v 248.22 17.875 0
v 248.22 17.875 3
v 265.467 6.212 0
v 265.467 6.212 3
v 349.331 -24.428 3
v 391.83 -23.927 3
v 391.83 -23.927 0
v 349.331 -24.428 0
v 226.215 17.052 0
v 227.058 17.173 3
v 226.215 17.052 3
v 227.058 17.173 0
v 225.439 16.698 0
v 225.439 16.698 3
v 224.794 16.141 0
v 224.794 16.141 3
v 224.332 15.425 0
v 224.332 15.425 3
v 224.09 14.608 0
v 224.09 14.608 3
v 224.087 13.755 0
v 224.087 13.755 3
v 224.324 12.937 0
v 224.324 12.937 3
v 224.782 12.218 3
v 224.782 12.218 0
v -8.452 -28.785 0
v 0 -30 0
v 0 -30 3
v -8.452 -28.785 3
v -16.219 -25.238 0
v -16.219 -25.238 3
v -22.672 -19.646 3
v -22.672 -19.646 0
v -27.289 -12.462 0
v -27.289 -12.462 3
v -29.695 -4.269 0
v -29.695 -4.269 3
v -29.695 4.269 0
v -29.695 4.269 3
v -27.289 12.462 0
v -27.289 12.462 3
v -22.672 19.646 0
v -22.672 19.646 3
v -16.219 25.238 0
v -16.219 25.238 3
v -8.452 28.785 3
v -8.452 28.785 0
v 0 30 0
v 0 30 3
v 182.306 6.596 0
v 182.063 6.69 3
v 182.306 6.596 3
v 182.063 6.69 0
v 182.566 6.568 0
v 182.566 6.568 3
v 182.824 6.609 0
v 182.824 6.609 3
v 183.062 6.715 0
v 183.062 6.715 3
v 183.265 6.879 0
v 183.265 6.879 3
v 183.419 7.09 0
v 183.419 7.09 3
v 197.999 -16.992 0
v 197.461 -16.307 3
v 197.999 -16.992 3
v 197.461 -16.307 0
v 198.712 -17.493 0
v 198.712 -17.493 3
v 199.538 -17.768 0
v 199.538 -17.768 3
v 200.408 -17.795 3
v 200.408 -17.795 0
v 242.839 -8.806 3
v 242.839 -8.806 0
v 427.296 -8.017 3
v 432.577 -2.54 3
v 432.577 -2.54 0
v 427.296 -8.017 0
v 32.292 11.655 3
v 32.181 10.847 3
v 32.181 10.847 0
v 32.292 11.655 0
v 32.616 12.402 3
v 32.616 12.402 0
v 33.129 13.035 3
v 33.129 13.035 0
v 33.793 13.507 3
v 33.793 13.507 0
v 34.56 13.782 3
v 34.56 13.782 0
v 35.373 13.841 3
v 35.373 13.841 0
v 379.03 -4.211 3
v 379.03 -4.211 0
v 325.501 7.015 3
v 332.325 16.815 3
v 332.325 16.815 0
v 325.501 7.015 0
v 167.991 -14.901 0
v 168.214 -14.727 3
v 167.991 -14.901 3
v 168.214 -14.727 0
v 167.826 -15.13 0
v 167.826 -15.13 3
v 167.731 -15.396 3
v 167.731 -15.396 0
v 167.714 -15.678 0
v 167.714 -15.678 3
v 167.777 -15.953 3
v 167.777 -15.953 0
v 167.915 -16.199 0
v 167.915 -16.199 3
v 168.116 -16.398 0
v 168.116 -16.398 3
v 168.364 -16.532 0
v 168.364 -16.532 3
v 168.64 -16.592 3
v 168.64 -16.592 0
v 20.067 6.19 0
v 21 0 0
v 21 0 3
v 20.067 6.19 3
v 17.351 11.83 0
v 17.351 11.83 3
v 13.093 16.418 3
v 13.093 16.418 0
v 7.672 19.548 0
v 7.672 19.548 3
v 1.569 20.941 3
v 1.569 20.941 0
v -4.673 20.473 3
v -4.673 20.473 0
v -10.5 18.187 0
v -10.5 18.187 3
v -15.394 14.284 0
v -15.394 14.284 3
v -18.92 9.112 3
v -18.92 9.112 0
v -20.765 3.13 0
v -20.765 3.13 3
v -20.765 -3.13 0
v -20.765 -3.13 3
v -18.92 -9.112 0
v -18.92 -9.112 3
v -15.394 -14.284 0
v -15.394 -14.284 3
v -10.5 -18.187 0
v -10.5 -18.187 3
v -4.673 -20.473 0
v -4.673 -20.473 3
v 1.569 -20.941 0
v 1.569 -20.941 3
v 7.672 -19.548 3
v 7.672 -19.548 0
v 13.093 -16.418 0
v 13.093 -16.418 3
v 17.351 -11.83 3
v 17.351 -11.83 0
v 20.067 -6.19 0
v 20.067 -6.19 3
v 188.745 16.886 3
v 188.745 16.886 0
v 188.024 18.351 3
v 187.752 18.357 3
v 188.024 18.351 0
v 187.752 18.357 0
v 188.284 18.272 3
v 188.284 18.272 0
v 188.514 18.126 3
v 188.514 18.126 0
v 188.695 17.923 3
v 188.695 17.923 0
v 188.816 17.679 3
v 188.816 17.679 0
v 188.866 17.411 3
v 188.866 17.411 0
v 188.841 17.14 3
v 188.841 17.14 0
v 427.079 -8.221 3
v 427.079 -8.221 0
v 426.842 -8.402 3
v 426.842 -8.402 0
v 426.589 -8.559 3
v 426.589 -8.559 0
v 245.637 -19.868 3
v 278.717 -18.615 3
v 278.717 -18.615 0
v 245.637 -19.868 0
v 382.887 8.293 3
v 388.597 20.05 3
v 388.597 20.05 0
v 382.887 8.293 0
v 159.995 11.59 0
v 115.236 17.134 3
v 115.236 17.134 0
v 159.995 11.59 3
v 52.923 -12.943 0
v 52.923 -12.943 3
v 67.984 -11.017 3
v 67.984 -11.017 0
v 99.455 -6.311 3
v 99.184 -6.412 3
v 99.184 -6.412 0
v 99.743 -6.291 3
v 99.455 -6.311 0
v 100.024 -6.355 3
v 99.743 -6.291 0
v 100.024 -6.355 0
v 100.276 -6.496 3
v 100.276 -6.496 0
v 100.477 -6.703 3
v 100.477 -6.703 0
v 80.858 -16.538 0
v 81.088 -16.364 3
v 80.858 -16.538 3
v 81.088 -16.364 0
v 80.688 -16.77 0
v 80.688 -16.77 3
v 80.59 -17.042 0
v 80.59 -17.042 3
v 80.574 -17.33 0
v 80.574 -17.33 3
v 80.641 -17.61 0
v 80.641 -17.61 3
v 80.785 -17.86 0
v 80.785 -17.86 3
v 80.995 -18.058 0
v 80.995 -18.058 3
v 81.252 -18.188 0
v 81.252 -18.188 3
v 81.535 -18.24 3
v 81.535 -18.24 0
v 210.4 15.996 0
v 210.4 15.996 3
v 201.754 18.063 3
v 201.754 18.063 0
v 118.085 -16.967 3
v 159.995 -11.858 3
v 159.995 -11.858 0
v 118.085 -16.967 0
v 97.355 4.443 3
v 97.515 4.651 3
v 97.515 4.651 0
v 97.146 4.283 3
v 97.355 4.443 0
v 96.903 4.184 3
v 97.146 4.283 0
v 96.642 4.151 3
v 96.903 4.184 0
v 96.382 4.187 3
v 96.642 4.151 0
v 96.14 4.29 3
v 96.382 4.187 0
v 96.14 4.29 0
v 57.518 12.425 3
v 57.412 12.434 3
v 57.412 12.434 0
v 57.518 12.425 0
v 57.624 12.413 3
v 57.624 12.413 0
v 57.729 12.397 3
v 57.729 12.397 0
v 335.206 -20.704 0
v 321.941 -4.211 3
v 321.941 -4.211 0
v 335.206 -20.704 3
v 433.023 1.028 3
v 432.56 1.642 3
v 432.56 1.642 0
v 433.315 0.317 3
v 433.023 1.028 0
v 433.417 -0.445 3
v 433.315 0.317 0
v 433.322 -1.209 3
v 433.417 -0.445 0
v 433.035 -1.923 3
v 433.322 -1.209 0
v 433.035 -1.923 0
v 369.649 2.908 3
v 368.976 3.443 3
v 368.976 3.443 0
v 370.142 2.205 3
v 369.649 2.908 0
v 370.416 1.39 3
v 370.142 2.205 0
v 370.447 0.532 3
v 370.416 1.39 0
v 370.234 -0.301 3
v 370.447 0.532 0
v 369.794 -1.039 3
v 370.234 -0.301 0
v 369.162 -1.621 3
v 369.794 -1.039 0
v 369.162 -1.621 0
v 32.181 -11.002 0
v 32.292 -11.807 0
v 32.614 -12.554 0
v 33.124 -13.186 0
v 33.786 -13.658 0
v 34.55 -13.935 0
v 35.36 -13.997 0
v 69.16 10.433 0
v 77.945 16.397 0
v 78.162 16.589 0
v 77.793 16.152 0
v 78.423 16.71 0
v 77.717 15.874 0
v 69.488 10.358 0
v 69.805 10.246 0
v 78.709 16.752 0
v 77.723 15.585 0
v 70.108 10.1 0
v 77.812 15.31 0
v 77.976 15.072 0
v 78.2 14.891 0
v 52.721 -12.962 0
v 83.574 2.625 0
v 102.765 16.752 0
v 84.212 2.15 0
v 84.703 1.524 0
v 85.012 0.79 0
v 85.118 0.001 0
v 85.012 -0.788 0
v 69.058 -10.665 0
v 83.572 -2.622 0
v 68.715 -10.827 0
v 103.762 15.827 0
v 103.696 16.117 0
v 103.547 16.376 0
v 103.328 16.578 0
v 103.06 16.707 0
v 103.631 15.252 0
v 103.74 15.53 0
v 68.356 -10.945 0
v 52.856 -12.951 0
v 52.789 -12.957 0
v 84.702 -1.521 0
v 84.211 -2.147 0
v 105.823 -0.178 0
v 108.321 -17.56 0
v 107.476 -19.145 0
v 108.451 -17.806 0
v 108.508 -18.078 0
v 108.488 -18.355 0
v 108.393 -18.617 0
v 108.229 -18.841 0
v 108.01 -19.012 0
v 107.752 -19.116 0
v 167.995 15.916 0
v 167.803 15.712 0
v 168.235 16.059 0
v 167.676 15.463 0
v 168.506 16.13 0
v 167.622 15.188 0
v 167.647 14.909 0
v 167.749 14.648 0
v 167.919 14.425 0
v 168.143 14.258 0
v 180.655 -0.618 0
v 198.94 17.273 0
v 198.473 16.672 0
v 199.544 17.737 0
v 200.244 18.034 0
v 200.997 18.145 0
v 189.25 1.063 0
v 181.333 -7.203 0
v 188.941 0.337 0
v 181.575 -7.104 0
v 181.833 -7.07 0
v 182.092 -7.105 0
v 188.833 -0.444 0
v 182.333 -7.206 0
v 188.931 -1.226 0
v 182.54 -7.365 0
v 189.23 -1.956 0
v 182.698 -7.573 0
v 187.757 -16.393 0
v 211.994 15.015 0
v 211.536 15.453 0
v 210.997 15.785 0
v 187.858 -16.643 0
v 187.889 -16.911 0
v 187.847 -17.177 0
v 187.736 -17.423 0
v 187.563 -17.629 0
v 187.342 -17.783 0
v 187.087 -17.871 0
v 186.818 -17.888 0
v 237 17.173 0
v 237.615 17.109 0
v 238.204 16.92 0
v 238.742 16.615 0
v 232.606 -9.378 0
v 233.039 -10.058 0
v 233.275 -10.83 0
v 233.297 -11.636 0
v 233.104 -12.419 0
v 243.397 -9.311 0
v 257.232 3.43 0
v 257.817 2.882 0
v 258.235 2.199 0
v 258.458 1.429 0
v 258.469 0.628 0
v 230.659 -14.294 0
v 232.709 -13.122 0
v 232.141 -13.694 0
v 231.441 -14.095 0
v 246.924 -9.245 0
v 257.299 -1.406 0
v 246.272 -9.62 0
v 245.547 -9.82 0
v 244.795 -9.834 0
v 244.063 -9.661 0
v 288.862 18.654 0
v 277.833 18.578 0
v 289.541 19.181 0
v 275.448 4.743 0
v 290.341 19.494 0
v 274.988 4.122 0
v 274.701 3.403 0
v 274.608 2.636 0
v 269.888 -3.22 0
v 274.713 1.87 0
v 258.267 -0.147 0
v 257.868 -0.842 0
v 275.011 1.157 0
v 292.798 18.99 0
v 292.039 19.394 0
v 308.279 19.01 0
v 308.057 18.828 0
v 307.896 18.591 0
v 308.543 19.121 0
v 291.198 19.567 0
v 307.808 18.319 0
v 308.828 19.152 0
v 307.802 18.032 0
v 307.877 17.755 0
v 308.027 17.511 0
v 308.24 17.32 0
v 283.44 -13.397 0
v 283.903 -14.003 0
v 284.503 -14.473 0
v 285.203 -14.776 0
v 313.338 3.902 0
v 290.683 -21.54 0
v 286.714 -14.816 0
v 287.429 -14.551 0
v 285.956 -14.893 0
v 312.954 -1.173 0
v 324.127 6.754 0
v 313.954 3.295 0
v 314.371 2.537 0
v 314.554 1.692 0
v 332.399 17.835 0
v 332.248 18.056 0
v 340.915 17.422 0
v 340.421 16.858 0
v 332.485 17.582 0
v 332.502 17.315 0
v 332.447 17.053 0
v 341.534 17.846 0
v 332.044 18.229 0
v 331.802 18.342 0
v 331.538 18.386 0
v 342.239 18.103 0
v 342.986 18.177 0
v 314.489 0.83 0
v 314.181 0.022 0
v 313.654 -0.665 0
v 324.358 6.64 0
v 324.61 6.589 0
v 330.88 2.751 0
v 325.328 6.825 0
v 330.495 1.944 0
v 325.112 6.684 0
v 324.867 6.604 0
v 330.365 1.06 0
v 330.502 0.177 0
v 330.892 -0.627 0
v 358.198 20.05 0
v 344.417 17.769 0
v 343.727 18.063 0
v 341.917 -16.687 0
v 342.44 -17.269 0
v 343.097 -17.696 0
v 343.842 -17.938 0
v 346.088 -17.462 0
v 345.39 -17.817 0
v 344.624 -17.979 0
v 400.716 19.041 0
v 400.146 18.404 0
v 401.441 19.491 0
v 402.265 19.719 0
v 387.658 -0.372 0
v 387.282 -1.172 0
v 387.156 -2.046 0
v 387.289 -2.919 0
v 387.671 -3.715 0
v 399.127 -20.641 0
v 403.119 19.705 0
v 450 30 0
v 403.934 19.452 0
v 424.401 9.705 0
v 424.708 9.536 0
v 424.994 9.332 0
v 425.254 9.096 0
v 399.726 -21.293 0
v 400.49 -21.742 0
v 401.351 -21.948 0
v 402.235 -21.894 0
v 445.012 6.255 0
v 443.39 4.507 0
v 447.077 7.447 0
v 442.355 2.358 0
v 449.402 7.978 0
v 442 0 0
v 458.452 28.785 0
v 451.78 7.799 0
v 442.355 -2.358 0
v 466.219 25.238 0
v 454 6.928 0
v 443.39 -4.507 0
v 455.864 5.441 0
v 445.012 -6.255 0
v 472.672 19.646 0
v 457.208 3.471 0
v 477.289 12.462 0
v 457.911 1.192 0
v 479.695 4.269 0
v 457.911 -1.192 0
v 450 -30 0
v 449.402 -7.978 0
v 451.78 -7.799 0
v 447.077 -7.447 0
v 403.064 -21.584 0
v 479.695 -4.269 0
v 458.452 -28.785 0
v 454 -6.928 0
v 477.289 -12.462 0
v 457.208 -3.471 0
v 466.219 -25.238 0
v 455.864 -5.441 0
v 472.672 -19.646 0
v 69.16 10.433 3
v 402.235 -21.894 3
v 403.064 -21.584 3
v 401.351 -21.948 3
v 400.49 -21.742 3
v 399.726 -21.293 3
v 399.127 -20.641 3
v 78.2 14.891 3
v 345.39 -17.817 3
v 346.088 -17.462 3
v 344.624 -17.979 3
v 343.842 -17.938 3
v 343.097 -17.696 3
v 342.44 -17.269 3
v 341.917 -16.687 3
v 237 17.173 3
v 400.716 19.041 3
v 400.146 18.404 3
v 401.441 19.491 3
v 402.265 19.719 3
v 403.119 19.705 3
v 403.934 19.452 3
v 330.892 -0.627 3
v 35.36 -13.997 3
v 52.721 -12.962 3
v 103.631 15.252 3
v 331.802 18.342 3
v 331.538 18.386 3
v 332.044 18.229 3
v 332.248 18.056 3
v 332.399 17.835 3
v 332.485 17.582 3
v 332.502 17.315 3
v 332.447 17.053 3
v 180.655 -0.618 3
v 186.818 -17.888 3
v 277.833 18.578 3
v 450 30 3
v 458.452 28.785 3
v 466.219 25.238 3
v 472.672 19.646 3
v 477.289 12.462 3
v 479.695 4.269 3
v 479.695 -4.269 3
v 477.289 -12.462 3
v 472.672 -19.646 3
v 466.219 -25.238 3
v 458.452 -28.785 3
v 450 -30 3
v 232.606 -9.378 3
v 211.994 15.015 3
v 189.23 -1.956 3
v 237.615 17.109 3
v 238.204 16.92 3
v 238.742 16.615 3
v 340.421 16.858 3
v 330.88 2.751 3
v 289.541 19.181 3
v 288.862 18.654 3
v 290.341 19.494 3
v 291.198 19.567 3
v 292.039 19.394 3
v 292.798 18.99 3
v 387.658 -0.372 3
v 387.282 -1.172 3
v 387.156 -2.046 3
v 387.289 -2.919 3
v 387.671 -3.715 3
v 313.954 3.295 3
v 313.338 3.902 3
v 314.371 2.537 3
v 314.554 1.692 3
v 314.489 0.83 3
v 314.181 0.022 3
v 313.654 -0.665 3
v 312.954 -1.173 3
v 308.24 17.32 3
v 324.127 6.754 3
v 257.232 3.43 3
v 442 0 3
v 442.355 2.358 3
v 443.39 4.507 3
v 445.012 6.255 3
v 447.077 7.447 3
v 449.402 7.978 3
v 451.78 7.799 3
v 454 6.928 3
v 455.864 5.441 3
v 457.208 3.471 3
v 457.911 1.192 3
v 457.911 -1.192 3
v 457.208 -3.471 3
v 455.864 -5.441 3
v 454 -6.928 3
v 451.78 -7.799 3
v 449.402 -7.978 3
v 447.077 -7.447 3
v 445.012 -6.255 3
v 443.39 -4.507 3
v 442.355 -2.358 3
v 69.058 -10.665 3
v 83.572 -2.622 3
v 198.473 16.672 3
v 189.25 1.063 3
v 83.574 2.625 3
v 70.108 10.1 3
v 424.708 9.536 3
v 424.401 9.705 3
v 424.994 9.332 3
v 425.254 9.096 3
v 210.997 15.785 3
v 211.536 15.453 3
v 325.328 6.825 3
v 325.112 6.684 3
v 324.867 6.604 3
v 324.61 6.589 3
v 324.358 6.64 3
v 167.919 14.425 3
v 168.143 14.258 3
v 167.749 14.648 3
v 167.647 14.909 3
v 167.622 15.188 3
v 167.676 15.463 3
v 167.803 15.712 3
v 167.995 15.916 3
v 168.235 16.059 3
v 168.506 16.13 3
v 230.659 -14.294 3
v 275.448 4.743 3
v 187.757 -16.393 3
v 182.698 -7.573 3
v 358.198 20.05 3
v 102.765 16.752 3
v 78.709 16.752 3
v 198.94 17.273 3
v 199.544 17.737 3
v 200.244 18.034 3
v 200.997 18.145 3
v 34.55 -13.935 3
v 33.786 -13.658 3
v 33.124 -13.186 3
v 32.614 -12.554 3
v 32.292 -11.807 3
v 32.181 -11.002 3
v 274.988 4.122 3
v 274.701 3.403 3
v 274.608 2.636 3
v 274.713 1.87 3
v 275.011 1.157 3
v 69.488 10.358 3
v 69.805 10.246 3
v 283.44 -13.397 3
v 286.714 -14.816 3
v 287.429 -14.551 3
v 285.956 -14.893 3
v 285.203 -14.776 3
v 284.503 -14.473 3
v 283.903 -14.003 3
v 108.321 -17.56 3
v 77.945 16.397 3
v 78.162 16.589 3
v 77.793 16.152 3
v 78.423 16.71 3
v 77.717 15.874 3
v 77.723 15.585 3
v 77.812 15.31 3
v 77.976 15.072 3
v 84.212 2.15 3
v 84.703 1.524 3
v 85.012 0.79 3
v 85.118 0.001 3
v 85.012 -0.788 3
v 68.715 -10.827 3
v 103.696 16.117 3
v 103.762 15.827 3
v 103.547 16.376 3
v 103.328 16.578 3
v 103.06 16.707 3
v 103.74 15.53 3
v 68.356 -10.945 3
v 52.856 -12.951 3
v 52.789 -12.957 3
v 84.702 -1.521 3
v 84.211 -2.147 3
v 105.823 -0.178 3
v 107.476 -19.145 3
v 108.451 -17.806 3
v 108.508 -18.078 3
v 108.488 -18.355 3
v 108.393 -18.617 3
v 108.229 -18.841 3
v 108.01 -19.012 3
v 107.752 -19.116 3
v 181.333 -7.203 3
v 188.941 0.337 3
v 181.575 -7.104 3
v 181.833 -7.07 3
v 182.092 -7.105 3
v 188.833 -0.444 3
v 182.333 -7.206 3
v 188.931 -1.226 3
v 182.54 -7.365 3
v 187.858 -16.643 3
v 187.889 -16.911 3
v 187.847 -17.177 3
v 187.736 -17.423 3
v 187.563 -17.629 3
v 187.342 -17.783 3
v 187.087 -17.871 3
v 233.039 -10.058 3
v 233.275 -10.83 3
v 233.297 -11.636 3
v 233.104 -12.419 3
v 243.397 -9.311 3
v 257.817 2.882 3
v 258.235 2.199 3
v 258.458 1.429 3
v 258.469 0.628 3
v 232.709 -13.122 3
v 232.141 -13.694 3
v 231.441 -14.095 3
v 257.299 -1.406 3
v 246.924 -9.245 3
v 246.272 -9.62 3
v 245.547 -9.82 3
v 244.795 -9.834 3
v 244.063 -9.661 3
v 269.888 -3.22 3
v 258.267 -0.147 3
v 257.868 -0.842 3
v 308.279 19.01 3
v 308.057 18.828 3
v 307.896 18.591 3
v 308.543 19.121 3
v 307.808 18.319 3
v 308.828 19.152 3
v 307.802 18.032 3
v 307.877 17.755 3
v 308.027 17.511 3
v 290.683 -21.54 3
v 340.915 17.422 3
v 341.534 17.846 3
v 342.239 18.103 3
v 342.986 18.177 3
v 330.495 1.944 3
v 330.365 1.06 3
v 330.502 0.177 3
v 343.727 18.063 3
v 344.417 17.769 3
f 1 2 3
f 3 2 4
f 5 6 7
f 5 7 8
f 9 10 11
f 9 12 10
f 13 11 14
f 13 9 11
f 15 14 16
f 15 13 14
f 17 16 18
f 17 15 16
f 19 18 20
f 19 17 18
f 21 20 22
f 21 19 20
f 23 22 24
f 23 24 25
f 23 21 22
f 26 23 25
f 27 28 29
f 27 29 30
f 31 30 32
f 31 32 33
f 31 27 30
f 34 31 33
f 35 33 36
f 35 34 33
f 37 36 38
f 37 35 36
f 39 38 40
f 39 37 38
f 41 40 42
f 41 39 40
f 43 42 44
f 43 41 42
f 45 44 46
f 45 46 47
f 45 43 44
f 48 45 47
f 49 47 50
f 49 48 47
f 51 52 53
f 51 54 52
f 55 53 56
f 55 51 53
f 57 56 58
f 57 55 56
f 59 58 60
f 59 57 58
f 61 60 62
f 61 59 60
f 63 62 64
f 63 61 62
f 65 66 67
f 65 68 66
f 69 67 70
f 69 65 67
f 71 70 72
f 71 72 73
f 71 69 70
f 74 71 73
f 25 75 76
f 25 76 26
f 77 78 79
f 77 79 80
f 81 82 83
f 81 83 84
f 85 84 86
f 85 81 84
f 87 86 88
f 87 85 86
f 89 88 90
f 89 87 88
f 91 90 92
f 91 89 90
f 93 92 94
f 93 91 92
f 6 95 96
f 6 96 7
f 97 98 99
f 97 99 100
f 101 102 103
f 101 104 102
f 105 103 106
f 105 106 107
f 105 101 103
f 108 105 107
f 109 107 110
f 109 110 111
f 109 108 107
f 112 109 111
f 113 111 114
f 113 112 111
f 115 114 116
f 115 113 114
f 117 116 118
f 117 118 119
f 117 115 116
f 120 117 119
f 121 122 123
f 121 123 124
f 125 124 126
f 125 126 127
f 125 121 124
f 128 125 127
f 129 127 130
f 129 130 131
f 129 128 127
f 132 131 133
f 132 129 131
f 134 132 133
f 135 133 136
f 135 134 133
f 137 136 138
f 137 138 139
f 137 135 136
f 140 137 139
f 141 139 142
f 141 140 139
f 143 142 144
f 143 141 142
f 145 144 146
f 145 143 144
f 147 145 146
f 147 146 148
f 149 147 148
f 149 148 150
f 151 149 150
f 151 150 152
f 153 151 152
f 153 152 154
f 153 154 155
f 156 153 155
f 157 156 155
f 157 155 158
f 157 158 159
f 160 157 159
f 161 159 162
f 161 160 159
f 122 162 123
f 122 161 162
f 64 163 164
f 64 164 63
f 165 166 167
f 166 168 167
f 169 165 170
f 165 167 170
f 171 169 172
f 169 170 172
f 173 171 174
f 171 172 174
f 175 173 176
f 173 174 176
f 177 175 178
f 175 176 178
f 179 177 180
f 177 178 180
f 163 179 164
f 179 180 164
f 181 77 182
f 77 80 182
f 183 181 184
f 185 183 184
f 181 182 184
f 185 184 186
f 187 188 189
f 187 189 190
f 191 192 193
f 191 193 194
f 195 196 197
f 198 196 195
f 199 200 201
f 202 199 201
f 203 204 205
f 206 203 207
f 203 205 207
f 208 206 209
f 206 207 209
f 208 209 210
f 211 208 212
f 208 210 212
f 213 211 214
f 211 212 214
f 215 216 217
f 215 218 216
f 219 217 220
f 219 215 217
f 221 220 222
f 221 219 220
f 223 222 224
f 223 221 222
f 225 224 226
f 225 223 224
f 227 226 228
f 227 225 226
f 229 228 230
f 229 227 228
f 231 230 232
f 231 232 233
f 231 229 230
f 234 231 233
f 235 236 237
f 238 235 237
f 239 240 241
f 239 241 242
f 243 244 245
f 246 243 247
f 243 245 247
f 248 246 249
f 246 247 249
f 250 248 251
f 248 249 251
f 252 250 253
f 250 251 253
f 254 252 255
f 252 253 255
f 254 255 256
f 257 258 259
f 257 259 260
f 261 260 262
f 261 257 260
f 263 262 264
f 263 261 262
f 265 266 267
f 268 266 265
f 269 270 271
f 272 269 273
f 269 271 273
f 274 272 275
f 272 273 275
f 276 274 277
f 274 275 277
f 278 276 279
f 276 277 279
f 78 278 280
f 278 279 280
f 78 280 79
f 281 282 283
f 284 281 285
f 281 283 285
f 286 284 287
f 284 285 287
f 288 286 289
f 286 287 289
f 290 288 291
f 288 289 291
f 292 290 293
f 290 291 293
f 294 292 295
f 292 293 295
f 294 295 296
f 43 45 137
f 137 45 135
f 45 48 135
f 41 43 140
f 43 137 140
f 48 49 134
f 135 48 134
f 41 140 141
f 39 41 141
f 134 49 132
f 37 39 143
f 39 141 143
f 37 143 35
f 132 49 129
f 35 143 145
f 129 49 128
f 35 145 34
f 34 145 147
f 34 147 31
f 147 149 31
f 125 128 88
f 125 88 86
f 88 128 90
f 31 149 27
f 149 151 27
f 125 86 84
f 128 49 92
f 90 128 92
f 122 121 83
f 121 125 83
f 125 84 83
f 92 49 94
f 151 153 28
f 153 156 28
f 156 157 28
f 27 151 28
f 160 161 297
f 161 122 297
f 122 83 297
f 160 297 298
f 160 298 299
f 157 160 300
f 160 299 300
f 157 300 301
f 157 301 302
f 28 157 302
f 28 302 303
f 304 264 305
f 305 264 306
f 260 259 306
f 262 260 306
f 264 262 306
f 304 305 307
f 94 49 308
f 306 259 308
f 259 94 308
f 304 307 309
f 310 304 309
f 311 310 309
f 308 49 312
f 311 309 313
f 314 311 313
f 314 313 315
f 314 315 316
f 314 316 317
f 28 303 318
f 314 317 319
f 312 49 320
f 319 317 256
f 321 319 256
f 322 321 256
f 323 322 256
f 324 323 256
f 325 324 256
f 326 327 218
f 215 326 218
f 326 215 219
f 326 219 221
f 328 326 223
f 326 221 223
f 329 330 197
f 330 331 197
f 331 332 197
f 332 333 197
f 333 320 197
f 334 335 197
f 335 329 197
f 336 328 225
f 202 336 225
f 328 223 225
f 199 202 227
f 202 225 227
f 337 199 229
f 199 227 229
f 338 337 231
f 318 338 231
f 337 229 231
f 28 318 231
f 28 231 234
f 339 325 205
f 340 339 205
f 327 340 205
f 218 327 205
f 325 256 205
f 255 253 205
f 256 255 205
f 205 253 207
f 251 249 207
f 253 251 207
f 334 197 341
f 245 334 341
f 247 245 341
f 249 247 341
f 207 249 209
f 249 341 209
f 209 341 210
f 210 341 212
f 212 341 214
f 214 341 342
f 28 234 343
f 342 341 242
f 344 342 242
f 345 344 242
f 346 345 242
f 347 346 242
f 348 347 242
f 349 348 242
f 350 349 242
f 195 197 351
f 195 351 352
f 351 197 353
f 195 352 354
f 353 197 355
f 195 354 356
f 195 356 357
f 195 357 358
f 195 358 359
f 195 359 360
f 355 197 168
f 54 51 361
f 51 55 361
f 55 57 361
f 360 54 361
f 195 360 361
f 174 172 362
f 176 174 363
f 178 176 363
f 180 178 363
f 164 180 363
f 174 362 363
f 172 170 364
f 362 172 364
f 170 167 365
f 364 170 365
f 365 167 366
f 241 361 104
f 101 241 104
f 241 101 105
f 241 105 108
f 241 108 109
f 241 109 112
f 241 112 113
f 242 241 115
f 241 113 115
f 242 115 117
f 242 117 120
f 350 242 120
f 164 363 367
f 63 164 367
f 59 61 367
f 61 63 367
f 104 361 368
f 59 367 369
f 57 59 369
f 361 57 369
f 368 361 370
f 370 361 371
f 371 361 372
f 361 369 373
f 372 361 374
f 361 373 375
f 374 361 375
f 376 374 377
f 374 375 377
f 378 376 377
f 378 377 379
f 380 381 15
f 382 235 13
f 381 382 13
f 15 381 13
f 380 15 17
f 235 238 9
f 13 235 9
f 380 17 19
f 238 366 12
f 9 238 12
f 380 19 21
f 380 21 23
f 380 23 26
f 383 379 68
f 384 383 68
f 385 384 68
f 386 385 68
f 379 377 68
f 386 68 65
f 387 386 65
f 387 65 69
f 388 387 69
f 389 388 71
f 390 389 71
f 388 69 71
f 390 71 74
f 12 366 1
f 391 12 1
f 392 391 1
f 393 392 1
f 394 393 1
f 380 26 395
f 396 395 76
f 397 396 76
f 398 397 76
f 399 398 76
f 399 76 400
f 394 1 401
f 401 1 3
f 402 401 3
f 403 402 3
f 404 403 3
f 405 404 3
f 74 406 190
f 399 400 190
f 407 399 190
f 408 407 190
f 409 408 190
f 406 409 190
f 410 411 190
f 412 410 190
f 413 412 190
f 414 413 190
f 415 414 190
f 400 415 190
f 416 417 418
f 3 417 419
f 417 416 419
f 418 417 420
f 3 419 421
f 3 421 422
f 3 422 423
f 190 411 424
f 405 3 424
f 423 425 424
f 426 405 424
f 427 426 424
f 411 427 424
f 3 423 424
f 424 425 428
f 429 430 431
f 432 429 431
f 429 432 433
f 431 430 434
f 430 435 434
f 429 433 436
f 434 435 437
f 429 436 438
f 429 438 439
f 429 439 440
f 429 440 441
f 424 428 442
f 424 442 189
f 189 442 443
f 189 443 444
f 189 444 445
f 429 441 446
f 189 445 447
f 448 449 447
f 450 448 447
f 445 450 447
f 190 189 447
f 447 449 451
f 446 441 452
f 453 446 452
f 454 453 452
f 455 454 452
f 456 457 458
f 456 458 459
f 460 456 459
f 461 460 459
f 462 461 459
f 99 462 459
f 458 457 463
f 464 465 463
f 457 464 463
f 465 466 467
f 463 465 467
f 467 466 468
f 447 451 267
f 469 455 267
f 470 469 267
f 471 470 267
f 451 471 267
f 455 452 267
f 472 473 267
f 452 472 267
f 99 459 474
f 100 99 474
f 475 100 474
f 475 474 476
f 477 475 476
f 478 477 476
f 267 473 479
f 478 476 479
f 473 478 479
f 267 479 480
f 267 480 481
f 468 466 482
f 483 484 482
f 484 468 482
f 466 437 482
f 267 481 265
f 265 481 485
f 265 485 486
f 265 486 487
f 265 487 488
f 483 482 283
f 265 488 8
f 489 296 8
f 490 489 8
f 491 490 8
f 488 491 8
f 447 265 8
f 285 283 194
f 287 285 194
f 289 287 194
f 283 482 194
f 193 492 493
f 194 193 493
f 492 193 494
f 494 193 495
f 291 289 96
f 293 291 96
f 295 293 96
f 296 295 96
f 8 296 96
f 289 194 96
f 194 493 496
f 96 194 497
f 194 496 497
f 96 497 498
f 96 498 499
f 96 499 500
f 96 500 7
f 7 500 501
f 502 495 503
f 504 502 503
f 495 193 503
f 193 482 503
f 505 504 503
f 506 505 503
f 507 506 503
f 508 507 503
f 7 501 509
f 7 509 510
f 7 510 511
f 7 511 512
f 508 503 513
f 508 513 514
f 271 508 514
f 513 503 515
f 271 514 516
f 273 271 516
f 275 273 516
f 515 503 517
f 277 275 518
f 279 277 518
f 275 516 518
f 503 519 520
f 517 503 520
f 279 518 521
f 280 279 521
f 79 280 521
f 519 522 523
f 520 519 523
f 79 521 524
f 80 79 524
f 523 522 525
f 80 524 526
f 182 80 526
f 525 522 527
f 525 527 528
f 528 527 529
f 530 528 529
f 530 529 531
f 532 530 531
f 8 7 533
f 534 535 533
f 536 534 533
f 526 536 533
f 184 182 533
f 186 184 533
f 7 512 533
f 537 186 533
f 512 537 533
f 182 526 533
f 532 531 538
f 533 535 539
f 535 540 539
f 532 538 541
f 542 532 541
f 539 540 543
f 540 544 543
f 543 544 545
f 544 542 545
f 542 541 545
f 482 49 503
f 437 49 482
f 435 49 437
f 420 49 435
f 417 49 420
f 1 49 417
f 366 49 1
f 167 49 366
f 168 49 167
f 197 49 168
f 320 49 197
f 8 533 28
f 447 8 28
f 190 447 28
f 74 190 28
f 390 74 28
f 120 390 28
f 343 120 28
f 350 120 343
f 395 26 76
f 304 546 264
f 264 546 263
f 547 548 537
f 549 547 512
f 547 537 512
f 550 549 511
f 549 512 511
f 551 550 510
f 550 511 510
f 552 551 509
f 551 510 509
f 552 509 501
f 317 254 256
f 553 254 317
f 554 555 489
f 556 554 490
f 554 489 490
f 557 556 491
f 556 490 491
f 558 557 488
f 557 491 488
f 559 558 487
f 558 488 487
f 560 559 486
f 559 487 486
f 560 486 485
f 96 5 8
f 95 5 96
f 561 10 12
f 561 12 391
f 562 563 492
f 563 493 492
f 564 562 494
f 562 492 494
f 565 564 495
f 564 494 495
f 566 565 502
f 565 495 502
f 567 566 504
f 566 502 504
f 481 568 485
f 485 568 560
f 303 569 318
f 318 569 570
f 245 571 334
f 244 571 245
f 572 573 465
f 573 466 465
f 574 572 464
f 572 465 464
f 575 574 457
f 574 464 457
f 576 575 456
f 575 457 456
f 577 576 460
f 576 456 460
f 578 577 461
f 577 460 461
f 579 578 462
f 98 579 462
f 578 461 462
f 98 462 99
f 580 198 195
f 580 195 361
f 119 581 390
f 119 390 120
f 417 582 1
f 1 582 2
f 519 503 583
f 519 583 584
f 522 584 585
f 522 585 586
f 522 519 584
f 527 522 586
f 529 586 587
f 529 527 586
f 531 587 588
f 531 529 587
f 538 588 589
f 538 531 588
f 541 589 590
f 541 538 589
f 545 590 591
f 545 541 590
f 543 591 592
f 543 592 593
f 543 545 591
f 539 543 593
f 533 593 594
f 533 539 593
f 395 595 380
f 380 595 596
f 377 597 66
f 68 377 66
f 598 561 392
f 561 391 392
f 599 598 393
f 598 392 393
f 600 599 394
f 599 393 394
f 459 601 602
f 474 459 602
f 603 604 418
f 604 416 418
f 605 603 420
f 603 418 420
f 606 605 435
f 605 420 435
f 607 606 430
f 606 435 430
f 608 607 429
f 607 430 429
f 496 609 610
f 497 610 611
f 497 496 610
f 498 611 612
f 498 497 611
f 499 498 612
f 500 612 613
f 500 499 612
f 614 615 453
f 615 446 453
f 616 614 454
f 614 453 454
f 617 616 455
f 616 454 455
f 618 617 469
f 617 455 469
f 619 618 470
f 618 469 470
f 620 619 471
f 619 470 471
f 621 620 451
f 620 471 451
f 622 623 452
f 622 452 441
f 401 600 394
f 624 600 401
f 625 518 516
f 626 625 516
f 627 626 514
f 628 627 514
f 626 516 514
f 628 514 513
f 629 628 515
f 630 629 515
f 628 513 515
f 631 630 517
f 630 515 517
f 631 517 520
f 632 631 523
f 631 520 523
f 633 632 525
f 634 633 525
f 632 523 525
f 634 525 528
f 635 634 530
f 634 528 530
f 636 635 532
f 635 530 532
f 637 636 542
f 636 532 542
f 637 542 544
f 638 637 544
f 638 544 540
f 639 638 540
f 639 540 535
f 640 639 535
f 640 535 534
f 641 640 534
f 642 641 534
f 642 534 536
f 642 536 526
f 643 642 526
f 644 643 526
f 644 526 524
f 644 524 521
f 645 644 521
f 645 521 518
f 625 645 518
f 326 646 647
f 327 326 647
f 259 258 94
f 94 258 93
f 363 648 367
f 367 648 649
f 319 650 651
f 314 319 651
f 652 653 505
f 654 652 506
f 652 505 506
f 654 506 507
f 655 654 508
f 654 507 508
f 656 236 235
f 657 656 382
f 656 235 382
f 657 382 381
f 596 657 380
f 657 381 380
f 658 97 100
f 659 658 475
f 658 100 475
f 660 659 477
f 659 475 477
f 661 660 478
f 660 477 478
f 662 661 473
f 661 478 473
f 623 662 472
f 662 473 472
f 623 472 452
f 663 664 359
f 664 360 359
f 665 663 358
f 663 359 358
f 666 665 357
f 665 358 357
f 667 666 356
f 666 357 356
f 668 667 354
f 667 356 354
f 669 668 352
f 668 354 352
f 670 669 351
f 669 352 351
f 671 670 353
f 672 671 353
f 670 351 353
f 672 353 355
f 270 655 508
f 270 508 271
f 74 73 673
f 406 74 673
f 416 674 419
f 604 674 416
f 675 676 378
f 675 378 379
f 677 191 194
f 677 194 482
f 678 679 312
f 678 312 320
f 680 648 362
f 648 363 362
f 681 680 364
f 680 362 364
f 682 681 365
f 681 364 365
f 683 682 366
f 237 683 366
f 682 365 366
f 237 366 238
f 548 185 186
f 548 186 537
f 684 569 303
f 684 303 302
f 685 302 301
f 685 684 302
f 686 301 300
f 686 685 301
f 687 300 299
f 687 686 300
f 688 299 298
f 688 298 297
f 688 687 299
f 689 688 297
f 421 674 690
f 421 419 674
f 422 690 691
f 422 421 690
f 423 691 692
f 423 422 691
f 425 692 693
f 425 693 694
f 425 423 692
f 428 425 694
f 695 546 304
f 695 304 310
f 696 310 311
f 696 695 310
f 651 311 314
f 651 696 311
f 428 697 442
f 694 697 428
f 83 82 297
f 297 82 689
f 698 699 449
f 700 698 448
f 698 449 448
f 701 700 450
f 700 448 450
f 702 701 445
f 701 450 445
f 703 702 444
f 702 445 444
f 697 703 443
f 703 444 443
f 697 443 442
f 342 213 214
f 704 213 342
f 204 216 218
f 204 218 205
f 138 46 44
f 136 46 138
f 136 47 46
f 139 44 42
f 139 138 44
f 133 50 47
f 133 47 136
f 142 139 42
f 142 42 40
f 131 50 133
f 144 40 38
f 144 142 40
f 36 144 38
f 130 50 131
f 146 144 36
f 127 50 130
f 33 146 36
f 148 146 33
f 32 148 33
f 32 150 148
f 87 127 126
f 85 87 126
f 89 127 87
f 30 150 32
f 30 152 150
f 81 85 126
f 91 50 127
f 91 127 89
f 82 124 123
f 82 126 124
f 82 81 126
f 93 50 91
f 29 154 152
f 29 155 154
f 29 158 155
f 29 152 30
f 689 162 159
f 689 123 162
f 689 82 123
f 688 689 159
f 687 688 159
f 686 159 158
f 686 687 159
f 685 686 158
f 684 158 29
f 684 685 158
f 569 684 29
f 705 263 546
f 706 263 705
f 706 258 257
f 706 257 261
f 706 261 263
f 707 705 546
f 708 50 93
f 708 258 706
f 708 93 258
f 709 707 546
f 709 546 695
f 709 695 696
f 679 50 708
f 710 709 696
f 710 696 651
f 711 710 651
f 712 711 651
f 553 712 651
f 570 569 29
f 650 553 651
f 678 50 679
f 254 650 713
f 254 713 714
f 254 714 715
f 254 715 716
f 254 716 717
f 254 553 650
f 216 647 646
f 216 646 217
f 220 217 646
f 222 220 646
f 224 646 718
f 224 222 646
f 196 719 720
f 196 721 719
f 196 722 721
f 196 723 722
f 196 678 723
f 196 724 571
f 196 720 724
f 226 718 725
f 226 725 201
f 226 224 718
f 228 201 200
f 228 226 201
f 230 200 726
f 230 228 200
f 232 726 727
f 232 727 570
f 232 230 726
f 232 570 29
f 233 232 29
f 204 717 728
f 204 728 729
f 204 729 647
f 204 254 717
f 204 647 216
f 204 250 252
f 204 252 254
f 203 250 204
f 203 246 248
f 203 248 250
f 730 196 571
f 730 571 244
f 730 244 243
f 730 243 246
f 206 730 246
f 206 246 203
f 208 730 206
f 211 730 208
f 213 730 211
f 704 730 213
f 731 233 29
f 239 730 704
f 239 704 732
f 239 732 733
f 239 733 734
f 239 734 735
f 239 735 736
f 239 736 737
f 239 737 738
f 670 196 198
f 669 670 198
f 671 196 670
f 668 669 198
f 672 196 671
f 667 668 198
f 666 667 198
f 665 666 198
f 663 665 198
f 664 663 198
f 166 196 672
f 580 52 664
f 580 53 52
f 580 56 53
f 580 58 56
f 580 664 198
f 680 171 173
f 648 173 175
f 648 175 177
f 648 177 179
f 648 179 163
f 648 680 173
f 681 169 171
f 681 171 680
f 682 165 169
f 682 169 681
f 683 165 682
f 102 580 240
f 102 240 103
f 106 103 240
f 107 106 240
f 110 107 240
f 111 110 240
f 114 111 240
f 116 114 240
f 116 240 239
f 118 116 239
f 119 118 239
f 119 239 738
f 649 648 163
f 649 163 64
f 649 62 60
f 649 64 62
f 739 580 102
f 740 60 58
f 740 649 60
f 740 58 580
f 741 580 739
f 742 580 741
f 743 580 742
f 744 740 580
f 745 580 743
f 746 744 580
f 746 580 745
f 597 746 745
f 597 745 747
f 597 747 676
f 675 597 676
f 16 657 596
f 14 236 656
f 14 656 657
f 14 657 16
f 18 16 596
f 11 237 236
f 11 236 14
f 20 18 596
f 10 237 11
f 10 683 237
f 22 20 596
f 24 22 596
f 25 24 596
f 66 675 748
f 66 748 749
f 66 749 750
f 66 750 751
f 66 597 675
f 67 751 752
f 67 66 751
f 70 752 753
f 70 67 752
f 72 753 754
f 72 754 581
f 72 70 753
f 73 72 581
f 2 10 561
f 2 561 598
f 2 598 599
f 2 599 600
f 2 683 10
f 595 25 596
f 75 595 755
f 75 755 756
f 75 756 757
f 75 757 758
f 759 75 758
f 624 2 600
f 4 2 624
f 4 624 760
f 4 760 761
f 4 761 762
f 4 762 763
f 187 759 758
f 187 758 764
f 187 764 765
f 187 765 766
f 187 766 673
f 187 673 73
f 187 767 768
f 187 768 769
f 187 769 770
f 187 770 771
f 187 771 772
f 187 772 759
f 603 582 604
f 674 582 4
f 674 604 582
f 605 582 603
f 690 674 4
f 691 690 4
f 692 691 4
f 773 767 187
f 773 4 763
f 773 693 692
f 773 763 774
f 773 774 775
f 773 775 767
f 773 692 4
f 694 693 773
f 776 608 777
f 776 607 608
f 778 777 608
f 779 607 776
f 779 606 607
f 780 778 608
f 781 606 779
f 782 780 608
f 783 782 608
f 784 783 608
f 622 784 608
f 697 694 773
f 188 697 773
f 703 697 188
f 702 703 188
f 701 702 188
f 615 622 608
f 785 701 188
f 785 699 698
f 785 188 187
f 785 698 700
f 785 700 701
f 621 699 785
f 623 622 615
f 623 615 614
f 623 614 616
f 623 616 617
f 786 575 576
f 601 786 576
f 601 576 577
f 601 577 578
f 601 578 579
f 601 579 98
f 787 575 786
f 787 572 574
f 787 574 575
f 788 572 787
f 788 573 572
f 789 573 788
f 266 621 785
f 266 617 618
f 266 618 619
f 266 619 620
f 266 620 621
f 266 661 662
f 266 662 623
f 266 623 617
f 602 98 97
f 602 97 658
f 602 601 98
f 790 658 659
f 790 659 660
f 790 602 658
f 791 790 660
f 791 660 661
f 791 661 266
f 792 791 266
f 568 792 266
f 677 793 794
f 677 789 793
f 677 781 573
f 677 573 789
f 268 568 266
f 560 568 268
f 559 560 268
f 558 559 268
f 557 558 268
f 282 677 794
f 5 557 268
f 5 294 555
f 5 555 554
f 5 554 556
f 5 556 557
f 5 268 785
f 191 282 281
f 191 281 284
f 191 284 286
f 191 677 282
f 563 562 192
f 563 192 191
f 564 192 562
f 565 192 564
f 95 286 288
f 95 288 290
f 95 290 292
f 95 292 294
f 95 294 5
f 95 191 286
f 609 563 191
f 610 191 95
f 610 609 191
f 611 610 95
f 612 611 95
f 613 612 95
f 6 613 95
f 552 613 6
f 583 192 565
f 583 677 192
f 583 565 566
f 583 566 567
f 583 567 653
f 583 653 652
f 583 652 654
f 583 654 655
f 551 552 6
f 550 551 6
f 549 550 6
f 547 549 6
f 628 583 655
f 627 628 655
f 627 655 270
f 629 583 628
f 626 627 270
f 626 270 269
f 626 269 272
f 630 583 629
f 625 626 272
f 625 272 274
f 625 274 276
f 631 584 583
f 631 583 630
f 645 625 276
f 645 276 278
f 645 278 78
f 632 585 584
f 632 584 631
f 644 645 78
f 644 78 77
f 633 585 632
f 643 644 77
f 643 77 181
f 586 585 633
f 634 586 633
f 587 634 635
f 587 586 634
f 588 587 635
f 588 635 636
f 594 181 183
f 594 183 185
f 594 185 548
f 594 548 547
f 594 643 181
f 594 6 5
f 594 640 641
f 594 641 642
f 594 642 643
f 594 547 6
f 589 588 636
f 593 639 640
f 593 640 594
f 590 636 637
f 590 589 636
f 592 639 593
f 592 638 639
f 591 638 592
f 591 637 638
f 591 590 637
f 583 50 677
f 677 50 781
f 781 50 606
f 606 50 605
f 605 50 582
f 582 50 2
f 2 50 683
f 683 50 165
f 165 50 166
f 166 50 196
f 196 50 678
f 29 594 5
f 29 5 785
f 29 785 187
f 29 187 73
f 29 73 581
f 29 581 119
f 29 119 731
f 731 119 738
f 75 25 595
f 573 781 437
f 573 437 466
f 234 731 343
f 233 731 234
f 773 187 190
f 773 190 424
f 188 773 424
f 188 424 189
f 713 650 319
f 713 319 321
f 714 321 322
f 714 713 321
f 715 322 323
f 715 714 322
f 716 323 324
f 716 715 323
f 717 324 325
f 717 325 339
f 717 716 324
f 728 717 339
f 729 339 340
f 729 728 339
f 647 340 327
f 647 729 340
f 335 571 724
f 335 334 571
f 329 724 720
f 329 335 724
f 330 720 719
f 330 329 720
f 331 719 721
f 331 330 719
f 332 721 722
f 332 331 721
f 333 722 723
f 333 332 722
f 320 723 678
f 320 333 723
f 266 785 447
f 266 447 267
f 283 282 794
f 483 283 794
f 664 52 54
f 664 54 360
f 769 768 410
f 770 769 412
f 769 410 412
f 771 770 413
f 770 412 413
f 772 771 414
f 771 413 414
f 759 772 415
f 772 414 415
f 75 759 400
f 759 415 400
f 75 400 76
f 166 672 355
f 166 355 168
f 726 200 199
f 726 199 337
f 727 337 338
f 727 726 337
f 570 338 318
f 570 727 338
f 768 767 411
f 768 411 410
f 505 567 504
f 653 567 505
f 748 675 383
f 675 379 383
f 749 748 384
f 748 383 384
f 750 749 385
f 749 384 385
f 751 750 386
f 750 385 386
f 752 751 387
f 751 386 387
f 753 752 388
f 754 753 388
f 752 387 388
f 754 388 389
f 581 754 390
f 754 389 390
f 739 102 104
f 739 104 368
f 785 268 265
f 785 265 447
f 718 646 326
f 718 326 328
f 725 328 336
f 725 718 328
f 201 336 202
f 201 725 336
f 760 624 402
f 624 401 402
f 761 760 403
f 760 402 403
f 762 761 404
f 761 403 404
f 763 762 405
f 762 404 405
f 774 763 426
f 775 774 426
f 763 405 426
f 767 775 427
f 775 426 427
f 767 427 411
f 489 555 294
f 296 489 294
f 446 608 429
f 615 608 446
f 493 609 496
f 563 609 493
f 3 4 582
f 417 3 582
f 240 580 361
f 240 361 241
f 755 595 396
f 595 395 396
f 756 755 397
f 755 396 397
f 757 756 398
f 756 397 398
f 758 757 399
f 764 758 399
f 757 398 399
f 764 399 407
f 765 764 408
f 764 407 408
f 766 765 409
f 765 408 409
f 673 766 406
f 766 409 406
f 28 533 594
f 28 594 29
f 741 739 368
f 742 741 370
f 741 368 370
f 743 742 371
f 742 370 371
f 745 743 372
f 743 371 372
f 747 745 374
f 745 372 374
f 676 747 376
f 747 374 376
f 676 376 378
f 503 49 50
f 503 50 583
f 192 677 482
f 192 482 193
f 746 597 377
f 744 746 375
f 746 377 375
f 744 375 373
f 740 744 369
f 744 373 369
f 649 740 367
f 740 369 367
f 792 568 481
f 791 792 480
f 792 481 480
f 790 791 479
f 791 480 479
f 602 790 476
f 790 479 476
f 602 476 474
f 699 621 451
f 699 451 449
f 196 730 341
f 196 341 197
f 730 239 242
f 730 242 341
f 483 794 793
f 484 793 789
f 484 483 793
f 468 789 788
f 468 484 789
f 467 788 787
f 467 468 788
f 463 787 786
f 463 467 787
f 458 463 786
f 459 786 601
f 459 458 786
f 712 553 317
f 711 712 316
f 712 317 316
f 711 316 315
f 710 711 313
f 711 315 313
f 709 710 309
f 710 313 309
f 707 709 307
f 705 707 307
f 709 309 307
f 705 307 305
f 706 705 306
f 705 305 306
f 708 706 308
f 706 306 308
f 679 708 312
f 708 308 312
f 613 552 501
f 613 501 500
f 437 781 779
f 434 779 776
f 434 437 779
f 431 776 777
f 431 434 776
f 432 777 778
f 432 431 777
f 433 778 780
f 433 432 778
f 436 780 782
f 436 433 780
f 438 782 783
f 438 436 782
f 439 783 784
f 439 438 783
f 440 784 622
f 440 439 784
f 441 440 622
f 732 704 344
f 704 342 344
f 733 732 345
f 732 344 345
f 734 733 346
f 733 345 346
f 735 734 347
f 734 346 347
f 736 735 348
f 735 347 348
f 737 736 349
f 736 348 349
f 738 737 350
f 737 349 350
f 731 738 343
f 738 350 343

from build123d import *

# Parameters (mm, degrees)
SKETCH1_R           = 21
BOSS_EXTRUDE1_DEPTH = 3
SKETCH2_R           = 8
CUT_EXTRUDE1_DEPTH  = 10
CUT_EXTRUDE2_DEPTH  = 10
FILLET1_R           = 3
FILLET2_R           = 1
FILLET3_R           = 3


with BuildPart() as part:
    # Sketch1 → Boss-Extrude1 (new body)
    with BuildSketch(Plane.XY):
        with BuildLine():
            Line((0, 30), (450, 30))
            ThreePointArc((450, 30), (480, 0), (450, -30))
            Line((450, -30), (0, -30))
            ThreePointArc((0, -30), (-30, 0), (0, 30))
        make_face()
        Circle(SKETCH1_R, mode=Mode.SUBTRACT)
    extrude(amount=BOSS_EXTRUDE1_DEPTH)

    # Sketch2 → Cut-Extrude1 (cut)
    with BuildSketch(Plane(origin=(0, 0, 0), x_dir=(-1, 0, 0), z_dir=(0, 0, -1))):
        with Locations((-450, 0)):
            Circle(SKETCH2_R)
    extrude(amount=-CUT_EXTRUDE1_DEPTH, mode=Mode.SUBTRACT)

    # Sketch4 → Cut-Extrude2 (cut)
    with BuildSketch(Plane.XY.offset(3)):
        Polygon((75.051155, 16.751903708), (104.496414244, 16.751903708), (97.010331386, 3.776026753), align=None)
        Polygon((115.236434087, 17.133628969), (159.994947493, 11.590143364), (180.655213039, -0.618195368), (159.994947493, -11.858002091), (118.085145684, -16.966802955), (105.823337098, -0.177570288), align=None)
        Polygon((189.665526052, 18.578346929), (182.941129647, 6.211814834), (165.368544986, 15.767042135), align=None)
        Polygon((199.599828734, 18.578346929), (188.361345274, -0.440625079), (198.44447832, -18.021795356), (236.21688029, -13.651304452), (211.35817569, 15.767042135), align=None)
        Polygon((220.526900823, 17.172694532), (237.960392272, 17.172694532), (260.559362669, 1.057868841), (244.675514904, -10.943884315), align=None)
        Polygon((265.46656767, 6.211814834), (277.833099766, 18.578346929), (248.220353812, 17.874878196), align=None)
        Polygon((165.368544986, -16.358724589), (182.200526719, -6.705265316), (188.690770328, -18.021795356), align=None)
        Polygon((245.637394842, -19.868271823), (269.887796501, -3.220439984), (278.716640894, -18.61460526), align=None)
        Polygon((290.68321902, -21.539751298), (321.940631216, -4.211371592), (335.206376445, -20.70401156), align=None)
        Polygon((341.992933025, 19.183441398), (329.735187473, 1.057868841), (343.614563911, -19.159806148), (373.065049946, 1.057868841), align=None)
        Polygon((273.877820417, 3.11420529), (290.68321902, 20.542728609), (317.209913689, 1.057868841), (284.881711611, -15.886302486), align=None)
        Polygon((305.30736893, 19.270974689), (333.375882047, 18.324324896), (324.94206251, 6.211814834), align=None)
        Polygon((358.198045962, 20.050204211), (388.597492455, 20.050204211), (382.886534474, 8.292807575), align=None)
        Polygon((349.331047186, -24.428108969), (379.030224427, -4.211371592), (391.830023208, -23.92704923), align=None)
        Polygon((386.543005003, -2.048490112), (401.586425759, 20.569577221), (424.881274354, 9.475873595), (434.601030173, -0.440625079), (426.98326683, -8.340846264), (400.664497987, -22.912566492), align=None)
        Polygon((77.908222084, -18.113128875), (99.959146412, -5.986003719), (109.517710051, -19.216558315), align=None)
        Polygon((32.181427401, 14.045195837), (32.181427401, -14.186471438), (52.8225456, -12.955618238), (68.554424875, -10.943884315), (88.302954178, 0), (69.662476286, 10.346921974), (57.571708379, 12.423629667), align=None)
    extrude(amount=-CUT_EXTRUDE2_DEPTH, mode=Mode.SUBTRACT)

    # Fillet1
    # the kernel refuses this fillet: 3 mm, written as the material it adds along each edge
    with BuildSketch(Plane(origin=(32.181427401, 14.045195837, 3), x_dir=(0, -1, 0), z_dir=(0, 0, -1))) as fillet1_piece_1:
        with BuildLine():
            CenterArc((FILLET1_R * 1.06590295895, -FILLET1_R), FILLET1_R, 90, 93.654267812)
            Line((FILLET1_R * 0.0679361503378, -FILLET1_R * 1.06373577423), (0, 0))
            Line((0, 0), (FILLET1_R * 1.06590295895, 0))
        make_face()
    extrude(amount=3)
    with BuildSketch(Plane(origin=(57.571708379, 12.423629667, 3), x_dir=(-0.9979668086083109, 0.06373577422564991, 0), z_dir=(0, 0, -1))) as fillet1_piece_2:
        with BuildLine():
            CenterArc((FILLET1_R * 0.0532106389046, -FILLET1_R), FILLET1_R, 90, 6.091745071)
            Line((-FILLET1_R * 0.0529101714038, -FILLET1_R * 0.00564675611758), (0, 0))
            Line((0, 0), (FILLET1_R * 0.0532106389046, 0))
        make_face()
    extrude(amount=3)
    with BuildSketch(Plane(origin=(69.662476286, 10.346921974, 3), x_dir=(-0.9855678414202016, 0.16928092024302194, 0), z_dir=(0, 0, -1))) as fillet1_piece_3:
        with BuildLine():
            CenterArc((FILLET1_R * 0.169924527084, -FILLET1_R), FILLET1_R, 90, 19.287684891)
            Line((-FILLET1_R * 0.160386998178, -FILLET1_R * 0.0561280297205), (0, 0))
            Line((0, 0), (FILLET1_R * 0.169924527084, 0))
        make_face()
    extrude(amount=3)
    with BuildSketch(Plane(origin=(88.302954178, 0, 3), x_dir=(-0.8743344213622383, 0.48532393266885154, 0), z_dir=(0, 0, -1))) as fillet1_piece_4:
        with BuildLine():
            CenterArc((FILLET1_R * 1.80303637433, -FILLET1_R), FILLET1_R, 90, 121.972748141)
            Line((FILLET1_R * 0.954736326134, -FILLET1_R * 1.52951584323), (0, 0))
            Line((0, 0), (FILLET1_R * 1.80303637433, 0))
        make_face()
    extrude(amount=3)
    with BuildSketch(Plane(origin=(68.554424875, -10.943884315, 3), x_dir=(0.8746742438686059, 0.4847112203290558, 0), z_dir=(0, 0, -1))) as fillet1_piece_5:
        with BuildLine():
            CenterArc((FILLET1_R * 0.191722072286, -FILLET1_R), FILLET1_R, 90, 21.70633324)
            Line((-FILLET1_R * 0.178127385219, -FILLET1_R * 0.0709083044269), (0, 0))
            Line((0, 0), (FILLET1_R * 0.191722072286, 0))
        make_face()
    extrude(amount=3)
    with BuildSketch(Plane(origin=(52.8225456, -12.955618238, 3), x_dir=(0.9919227581955331, 0.1268433749699441, 0), z_dir=(0, 0, -1))) as fillet1_piece_6:
        with BuildLine():
            CenterArc((FILLET1_R * 0.0338255904119, -FILLET1_R), FILLET1_R, 90, 3.874649837)
            Line((-FILLET1_R * 0.0337482743847, -FILLET1_R * 0.00228572587316), (0, 0))
            Line((0, 0), (FILLET1_R * 0.0338255904119, 0))
        make_face()
    extrude(amount=3)
    with BuildSketch(Plane(origin=(32.181427401, -14.186471438, 3), x_dir=(0, 1, 0), z_dir=(0, 0, -1))) as fillet1_piece_7:
        with BuildLine():
            CenterArc((FILLET1_R * 1.06140748795, FILLET1_R), FILLET1_R, 176.587428992, 93.412571008)
            Line((FILLET1_R * 0.0631806961919, FILLET1_R * 1.05952539143), (0, 0))
            Line((0, 0), (FILLET1_R * 1.06140748795, 0))
        make_face()
    extrude(amount=3)

    # Fillet2
    fillet2_edges = [part.edges().sort_by_distance(p)[0] for p in [
        (188.690770328, -18.021795356, 1.5),
        (165.368544986, -16.358724589, 1.5),
        (182.200526719, -6.705265316, 1.5),
        (97.010331386, 3.776026753, 1.5),
        (75.051155, 16.751903708, 1.5),
        (104.496414244, 16.751903708, 1.5),
        (165.368544986, 15.767042135, 1.5),
        (189.665526052, 18.578346929, 1.5),
        (182.941129647, 6.211814834, 1.5),
        (109.517710051, -19.216558315, 1.5),
        (77.908222084, -18.113128875, 1.5),
        (99.959146412, -5.986003719, 1.5),
        (324.94206251, 6.211814834, 1.5),
        (305.30736893, 19.270974689, 1.5),
        (333.375882047, 18.324324896, 1.5),
    ]]
    fillet(fillet2_edges, radius=FILLET2_R)

    # Fillet3
    fillet3_edges = [part.edges().sort_by_distance(p)[0] for p in [
        (199.599828734, 18.578346929, 1.5),
        (211.35817569, 15.767042135, 1.5),
        (236.21688029, -13.651304452, 1.5),
        (198.44447832, -18.021795356, 1.5),
        (188.361345274, -0.440625079, 1.5),
        (400.664497987, -22.912566492, 1.5),
        (386.543005003, -2.048490112, 1.5),
        (401.586425759, 20.569577221, 1.5),
        (424.881274354, 9.475873595, 1.5),
        (434.601030173, -0.440625079, 1.5),
        (426.98326683, -8.340846264, 1.5),
        (341.992933025, 19.183441398, 1.5),
        (373.065049946, 1.057868841, 1.5),
        (343.614563911, -19.159806148, 1.5),
        (329.735187473, 1.057868841, 1.5),
        (284.881711611, -15.886302486, 1.5),
        (273.877820417, 3.11420529, 1.5),
        (290.68321902, 20.542728609, 1.5),
        (317.209913689, 1.057868841, 1.5),
        (244.675514904, -10.943884315, 1.5),
        (220.526900823, 17.172694532, 1.5),
        (237.960392272, 17.172694532, 1.5),
        (260.559362669, 1.057868841, 1.5),
    ]]
    fillet(fillet3_edges, radius=FILLET3_R)


solid = part.part
